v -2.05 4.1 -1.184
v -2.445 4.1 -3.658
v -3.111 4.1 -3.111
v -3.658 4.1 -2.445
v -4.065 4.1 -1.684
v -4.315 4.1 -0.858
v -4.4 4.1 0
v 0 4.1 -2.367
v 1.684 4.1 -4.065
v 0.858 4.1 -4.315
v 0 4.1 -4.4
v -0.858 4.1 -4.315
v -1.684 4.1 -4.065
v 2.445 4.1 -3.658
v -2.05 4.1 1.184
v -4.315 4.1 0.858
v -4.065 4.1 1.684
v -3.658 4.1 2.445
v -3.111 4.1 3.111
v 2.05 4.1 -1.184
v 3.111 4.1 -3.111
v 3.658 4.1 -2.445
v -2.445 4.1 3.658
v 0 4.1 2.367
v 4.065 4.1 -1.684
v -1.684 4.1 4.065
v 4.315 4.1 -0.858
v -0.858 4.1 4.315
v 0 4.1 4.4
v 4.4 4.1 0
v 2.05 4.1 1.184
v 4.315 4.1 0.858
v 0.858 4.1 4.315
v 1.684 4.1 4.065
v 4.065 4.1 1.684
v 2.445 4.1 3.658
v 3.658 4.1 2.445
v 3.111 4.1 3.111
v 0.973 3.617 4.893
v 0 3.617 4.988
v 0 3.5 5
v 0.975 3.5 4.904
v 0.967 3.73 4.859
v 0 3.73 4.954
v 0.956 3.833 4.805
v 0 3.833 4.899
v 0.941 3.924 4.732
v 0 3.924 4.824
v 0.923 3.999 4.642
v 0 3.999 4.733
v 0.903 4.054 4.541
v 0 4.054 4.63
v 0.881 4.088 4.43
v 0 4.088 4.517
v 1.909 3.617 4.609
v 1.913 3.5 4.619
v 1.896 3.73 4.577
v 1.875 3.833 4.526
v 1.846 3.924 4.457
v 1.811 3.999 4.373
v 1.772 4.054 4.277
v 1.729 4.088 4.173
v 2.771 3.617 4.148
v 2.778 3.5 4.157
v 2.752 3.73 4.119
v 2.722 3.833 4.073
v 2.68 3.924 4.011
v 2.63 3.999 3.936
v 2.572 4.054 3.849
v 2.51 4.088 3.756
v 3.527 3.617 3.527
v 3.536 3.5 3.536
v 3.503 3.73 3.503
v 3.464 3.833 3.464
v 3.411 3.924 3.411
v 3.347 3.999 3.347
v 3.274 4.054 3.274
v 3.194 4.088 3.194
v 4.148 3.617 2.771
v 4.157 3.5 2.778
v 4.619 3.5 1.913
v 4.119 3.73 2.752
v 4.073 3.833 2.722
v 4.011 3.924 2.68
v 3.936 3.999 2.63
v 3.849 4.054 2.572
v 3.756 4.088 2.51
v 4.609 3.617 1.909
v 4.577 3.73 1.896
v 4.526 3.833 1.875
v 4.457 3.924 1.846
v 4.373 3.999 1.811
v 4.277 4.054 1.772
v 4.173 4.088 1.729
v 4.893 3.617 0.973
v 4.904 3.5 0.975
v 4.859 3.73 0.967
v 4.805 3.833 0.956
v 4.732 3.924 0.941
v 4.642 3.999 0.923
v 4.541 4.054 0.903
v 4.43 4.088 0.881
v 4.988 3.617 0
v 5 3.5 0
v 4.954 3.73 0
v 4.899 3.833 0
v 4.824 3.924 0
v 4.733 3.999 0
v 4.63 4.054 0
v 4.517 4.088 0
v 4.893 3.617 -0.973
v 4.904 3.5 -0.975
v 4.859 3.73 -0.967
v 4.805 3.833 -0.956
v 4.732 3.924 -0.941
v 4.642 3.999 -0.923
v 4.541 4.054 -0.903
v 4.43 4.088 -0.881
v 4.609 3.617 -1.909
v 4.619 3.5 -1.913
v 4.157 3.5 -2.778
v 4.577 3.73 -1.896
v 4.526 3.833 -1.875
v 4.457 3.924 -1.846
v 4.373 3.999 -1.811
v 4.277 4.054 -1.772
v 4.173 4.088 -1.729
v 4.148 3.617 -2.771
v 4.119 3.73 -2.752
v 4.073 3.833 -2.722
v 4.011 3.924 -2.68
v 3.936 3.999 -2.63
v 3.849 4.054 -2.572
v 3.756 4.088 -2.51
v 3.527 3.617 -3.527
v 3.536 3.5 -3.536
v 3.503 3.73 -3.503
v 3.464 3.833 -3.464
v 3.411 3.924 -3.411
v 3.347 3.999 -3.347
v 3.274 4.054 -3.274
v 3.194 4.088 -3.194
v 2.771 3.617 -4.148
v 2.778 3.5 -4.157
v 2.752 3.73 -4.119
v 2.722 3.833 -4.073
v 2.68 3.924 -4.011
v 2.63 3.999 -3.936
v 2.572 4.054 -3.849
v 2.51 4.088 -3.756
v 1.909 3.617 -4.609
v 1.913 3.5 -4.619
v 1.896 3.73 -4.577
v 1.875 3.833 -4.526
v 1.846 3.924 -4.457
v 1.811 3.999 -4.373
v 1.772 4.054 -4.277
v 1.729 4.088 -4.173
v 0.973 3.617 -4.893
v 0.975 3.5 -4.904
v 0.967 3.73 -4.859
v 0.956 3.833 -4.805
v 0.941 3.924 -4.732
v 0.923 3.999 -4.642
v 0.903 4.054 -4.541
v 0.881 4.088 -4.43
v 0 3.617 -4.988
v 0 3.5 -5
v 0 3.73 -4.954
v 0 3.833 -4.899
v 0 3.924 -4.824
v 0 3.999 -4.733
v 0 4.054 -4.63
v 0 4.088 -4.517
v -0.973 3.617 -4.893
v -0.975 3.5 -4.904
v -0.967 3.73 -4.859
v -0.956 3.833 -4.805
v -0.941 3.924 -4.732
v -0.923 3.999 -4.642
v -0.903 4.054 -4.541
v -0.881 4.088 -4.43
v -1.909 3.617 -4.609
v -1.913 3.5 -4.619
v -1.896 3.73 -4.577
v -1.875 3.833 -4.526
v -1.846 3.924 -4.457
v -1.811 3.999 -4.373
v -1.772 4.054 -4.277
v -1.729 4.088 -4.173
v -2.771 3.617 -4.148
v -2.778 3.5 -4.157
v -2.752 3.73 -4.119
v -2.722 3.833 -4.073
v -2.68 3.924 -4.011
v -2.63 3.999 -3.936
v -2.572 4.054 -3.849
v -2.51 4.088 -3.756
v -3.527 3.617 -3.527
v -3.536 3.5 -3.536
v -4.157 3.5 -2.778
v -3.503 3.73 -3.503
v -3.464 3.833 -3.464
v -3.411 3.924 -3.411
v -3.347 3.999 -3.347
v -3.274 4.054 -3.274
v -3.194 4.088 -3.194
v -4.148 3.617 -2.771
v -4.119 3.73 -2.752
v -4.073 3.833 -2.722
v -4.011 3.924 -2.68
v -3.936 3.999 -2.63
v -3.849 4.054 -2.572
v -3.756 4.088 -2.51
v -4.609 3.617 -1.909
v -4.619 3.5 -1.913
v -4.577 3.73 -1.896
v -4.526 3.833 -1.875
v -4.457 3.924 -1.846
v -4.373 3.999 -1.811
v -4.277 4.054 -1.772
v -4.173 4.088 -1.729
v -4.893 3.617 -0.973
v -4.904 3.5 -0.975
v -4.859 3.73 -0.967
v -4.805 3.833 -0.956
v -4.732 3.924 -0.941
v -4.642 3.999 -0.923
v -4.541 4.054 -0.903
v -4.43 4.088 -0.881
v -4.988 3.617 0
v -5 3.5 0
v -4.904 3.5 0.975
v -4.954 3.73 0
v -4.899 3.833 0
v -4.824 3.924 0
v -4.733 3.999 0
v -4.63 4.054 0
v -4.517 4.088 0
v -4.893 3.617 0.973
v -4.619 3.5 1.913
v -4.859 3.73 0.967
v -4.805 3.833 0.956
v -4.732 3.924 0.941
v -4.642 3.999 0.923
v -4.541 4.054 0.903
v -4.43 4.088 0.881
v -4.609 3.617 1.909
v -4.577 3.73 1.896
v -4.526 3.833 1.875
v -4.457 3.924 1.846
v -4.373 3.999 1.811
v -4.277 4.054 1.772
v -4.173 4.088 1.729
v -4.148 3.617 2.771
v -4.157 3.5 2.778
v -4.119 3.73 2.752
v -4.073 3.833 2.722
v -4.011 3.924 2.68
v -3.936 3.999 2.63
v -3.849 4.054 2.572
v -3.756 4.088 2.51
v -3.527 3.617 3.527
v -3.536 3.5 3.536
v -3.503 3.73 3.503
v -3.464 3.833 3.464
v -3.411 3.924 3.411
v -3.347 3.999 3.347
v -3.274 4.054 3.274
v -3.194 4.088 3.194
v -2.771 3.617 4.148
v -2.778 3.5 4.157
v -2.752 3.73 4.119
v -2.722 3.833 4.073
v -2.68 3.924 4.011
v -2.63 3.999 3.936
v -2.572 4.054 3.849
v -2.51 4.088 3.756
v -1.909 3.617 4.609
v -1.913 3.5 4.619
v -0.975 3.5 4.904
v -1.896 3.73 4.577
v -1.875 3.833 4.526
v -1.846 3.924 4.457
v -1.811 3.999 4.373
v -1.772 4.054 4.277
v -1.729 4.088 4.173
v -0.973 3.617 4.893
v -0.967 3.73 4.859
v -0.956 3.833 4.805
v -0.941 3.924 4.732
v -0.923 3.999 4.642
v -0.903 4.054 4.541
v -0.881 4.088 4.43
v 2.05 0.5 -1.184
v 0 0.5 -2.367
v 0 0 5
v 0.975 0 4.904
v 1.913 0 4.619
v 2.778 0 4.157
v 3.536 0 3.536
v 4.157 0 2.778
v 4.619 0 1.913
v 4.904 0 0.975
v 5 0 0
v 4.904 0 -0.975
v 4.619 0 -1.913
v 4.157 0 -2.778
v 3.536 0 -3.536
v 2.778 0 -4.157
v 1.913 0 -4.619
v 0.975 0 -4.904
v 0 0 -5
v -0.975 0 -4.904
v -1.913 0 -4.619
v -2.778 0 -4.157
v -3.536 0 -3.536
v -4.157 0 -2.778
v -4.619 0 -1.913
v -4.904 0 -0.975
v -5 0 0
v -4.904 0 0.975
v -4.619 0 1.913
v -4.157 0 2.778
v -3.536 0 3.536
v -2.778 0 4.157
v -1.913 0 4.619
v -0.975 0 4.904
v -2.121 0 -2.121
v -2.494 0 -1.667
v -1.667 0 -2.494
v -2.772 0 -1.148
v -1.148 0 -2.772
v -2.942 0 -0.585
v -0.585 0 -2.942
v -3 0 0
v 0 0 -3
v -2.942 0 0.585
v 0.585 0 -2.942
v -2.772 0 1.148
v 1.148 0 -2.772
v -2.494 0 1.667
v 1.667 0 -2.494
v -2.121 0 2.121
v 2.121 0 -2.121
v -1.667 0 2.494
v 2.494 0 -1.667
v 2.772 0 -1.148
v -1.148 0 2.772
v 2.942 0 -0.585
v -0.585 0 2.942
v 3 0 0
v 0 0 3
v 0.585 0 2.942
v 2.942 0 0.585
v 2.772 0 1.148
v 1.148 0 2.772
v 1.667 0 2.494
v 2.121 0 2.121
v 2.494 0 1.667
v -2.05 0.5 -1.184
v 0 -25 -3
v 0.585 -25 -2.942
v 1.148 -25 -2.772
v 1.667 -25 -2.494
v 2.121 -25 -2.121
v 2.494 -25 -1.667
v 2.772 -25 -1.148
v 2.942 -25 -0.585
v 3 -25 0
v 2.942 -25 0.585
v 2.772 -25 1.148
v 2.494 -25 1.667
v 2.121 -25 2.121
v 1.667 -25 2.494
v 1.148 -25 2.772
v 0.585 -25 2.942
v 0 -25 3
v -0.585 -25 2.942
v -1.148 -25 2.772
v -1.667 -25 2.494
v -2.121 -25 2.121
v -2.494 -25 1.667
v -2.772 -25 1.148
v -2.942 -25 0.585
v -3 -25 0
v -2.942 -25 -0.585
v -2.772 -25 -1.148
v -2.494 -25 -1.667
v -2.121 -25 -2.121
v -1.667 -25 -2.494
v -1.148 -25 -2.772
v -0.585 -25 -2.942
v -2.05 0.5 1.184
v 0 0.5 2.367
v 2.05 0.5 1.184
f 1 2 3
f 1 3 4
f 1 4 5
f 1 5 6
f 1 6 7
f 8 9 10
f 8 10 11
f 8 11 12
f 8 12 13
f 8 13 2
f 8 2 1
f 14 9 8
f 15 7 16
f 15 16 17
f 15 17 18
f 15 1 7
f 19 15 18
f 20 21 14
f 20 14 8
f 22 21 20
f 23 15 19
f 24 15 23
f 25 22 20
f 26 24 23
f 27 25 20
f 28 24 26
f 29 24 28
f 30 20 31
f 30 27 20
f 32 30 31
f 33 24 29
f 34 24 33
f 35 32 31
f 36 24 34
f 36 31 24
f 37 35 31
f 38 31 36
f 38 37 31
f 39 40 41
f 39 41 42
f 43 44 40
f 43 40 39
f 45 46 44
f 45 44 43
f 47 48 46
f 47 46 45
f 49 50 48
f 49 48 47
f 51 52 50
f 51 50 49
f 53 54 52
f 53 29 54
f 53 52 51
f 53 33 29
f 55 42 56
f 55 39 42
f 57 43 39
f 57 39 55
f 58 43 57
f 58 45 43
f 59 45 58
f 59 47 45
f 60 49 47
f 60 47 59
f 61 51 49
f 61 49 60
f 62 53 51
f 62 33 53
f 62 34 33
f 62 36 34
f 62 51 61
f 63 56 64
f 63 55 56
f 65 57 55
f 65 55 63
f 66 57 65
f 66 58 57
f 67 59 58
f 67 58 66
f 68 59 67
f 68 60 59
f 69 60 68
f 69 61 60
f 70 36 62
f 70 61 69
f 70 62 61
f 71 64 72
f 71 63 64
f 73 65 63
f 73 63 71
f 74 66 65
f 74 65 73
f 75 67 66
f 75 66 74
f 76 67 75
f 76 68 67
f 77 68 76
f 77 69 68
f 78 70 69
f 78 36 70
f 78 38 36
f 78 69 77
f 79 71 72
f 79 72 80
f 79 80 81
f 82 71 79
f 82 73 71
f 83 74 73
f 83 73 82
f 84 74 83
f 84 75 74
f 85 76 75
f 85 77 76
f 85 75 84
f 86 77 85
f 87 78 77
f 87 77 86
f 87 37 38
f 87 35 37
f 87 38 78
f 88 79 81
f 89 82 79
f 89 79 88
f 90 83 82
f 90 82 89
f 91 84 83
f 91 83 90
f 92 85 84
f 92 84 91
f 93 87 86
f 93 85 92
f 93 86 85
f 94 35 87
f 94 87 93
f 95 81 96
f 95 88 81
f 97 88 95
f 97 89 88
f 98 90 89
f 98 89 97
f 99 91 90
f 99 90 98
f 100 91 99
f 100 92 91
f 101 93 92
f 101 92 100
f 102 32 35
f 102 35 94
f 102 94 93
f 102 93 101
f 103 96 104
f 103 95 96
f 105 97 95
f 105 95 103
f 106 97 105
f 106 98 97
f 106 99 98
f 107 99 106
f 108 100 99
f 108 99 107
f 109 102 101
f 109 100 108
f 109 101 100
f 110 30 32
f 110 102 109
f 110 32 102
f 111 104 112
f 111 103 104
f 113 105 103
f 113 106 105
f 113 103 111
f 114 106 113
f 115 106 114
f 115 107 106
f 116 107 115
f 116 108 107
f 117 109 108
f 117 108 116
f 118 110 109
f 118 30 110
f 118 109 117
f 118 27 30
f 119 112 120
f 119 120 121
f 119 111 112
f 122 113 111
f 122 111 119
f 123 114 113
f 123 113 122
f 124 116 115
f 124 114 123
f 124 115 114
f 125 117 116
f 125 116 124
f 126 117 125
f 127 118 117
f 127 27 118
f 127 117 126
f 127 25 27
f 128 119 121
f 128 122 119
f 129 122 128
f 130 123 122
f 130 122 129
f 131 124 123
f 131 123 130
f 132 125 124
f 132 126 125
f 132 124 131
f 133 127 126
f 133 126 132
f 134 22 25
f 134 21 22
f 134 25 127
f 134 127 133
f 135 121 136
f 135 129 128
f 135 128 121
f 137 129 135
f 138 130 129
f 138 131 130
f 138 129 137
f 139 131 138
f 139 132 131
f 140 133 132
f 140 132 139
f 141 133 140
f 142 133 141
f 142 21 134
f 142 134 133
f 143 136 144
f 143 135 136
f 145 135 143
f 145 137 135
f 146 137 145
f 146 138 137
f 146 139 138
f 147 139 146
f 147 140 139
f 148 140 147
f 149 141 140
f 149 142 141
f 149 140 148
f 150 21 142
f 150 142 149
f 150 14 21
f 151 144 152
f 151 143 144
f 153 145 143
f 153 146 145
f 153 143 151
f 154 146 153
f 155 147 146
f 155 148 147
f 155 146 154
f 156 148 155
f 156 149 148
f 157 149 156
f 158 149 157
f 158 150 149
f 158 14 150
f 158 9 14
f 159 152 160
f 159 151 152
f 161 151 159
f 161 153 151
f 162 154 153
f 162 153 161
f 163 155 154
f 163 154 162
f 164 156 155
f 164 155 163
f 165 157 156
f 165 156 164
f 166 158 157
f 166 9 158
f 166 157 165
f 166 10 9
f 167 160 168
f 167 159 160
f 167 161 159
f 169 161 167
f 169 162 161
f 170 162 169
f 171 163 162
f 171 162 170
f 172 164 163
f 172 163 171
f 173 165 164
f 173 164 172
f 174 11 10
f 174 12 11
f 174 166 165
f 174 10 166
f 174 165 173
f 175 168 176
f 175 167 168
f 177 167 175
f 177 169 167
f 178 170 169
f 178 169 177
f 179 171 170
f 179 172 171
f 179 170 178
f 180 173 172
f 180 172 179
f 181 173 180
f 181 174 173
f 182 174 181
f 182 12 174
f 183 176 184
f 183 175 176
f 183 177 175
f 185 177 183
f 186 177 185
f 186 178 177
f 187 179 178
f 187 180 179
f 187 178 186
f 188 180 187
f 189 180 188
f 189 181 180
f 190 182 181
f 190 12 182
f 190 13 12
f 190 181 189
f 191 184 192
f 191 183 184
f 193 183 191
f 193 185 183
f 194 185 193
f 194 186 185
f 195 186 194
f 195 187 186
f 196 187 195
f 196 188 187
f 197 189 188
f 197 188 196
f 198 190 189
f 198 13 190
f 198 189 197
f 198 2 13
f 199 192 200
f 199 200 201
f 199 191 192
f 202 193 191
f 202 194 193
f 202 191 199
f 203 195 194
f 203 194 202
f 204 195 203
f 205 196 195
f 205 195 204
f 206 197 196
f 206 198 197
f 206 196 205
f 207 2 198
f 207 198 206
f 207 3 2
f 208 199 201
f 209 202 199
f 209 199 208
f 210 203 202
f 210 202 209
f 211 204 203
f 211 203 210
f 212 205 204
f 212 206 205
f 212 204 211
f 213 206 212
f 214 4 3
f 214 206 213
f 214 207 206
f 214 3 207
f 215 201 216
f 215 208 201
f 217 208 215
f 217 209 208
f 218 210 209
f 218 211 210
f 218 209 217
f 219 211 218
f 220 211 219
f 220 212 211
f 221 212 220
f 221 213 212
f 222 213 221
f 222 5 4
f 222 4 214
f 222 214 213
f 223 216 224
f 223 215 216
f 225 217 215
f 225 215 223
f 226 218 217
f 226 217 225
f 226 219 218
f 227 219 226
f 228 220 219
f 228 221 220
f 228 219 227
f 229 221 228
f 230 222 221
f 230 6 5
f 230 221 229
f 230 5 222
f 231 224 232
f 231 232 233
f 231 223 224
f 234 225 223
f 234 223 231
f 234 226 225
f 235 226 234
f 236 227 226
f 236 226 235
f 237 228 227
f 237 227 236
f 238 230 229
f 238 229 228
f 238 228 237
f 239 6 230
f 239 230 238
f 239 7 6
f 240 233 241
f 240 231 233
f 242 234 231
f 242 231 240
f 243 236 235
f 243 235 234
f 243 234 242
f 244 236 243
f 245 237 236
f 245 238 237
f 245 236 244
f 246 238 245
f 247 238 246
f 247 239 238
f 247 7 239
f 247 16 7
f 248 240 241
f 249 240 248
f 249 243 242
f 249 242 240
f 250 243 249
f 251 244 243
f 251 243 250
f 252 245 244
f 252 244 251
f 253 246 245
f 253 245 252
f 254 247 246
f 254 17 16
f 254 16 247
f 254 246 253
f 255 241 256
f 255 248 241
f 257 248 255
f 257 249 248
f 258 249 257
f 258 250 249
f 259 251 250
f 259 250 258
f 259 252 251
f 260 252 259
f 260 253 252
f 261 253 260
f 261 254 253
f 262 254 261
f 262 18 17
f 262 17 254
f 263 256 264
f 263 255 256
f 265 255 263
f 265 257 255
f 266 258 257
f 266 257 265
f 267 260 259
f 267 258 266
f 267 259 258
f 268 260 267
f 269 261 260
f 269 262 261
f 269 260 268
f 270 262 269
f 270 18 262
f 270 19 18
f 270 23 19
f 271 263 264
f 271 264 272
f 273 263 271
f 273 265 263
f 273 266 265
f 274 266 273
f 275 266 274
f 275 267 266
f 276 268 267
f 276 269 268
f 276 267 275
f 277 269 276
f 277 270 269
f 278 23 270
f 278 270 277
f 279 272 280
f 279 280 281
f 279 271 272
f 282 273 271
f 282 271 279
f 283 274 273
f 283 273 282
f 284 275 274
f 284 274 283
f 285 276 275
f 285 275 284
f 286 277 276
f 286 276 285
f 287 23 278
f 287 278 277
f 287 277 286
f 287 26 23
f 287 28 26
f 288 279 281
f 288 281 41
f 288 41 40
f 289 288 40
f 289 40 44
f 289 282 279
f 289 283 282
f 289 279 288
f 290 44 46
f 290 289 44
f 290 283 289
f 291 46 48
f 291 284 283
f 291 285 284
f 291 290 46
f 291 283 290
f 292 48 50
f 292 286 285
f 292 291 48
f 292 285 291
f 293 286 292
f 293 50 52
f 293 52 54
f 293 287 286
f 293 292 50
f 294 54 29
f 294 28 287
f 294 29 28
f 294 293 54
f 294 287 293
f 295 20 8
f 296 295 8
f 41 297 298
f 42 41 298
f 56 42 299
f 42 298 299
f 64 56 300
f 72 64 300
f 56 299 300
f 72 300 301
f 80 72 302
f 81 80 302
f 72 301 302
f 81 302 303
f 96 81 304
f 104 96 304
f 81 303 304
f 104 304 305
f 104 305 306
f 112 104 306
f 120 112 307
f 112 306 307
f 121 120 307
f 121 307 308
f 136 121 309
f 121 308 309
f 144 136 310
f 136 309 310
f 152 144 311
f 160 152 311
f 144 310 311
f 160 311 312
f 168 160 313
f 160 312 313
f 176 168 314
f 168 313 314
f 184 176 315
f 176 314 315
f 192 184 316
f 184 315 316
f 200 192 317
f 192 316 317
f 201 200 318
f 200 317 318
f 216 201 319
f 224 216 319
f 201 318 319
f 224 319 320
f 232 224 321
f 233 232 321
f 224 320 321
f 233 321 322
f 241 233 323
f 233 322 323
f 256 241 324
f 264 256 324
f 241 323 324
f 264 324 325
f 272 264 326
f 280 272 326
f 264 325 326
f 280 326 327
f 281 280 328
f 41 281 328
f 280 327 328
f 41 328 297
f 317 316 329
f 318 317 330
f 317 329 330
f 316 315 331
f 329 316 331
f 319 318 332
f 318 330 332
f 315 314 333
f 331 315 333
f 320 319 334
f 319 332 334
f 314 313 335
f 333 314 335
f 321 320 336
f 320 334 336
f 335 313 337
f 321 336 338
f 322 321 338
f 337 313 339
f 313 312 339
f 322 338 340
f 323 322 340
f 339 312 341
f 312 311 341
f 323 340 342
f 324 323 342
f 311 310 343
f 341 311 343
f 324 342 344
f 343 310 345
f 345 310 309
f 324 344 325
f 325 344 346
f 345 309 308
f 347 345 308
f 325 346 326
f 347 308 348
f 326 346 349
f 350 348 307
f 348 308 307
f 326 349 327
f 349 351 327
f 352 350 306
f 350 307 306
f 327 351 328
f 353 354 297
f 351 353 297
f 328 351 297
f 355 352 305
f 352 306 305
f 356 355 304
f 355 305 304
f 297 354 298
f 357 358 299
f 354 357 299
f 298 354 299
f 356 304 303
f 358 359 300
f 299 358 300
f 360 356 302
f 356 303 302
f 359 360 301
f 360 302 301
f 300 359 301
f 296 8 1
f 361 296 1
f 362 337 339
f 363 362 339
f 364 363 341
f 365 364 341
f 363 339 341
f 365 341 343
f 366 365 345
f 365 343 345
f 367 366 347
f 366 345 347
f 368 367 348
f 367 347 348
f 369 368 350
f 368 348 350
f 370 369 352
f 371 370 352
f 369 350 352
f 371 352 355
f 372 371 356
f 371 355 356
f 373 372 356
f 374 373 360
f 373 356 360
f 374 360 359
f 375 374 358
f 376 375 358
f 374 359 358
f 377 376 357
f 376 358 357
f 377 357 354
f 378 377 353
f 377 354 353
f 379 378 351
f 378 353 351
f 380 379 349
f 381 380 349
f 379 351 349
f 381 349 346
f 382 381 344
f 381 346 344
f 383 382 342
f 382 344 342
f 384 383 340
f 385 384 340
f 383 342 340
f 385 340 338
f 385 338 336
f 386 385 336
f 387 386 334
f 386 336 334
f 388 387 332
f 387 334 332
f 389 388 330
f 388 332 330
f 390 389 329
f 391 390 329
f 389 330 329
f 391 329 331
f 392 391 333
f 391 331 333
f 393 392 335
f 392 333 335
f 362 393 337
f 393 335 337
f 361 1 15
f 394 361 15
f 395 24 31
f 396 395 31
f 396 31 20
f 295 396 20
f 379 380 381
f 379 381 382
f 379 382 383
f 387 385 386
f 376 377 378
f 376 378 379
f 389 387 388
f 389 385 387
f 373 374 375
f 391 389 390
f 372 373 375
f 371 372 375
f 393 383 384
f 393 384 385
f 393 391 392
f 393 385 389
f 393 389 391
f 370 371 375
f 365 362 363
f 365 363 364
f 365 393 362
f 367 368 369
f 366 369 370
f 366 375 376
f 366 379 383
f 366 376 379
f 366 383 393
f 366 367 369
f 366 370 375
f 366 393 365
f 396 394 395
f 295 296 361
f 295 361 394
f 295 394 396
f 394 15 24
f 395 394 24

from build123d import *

# Parameters (mm, degrees)
SKETCH1_R           = 5
BOSS_EXTRUDE1_DEPTH = 4.1
FILLET1_R           = 0.6
CUT_EXTRUDE1_DEPTH  = 3.6
SKETCH3_R           = 3
BOSS_EXTRUDE2_DEPTH = 25


with BuildPart() as part:
    # Sketch1 → Boss-Extrude1 (new body)
    with BuildSketch(Plane(origin=(0, 0, 0), x_dir=(1, 0, 0), z_dir=(0, 1, 0))):
        with Locations(Location((0, 0, 0), (0, 0, 270))):
            Circle(SKETCH1_R)
    extrude(amount=BOSS_EXTRUDE1_DEPTH)

    # Fillet1
    fillet1_edges = [part.edges().sort_by_distance(p)[0] for p in [
        (0, 4.1, -5),
    ]]
    fillet(fillet1_edges, radius=FILLET1_R)

    # Sketch2 → Cut-Extrude1 (cut)
    with BuildSketch(Plane(origin=(0, 4.1, 0), x_dir=(1, 0, 0), z_dir=(0, 1, 0))):
        Polygon((0, -2.367136104), (2.05, -1.183568052), (2.05, 1.183568052), (0, 2.367136104), (-2.05, 1.183568052), (-2.05, -1.183568052), align=None)
    extrude(amount=-CUT_EXTRUDE1_DEPTH, mode=Mode.SUBTRACT)

    # Sketch3 → Boss-Extrude2 (add)
    with BuildSketch(Plane.XZ):
        with Locations(Location((0, 0, 0), (0, 0, 270))):
            Circle(SKETCH3_R)
    extrude(amount=BOSS_EXTRUDE2_DEPTH)


solid = part.part
